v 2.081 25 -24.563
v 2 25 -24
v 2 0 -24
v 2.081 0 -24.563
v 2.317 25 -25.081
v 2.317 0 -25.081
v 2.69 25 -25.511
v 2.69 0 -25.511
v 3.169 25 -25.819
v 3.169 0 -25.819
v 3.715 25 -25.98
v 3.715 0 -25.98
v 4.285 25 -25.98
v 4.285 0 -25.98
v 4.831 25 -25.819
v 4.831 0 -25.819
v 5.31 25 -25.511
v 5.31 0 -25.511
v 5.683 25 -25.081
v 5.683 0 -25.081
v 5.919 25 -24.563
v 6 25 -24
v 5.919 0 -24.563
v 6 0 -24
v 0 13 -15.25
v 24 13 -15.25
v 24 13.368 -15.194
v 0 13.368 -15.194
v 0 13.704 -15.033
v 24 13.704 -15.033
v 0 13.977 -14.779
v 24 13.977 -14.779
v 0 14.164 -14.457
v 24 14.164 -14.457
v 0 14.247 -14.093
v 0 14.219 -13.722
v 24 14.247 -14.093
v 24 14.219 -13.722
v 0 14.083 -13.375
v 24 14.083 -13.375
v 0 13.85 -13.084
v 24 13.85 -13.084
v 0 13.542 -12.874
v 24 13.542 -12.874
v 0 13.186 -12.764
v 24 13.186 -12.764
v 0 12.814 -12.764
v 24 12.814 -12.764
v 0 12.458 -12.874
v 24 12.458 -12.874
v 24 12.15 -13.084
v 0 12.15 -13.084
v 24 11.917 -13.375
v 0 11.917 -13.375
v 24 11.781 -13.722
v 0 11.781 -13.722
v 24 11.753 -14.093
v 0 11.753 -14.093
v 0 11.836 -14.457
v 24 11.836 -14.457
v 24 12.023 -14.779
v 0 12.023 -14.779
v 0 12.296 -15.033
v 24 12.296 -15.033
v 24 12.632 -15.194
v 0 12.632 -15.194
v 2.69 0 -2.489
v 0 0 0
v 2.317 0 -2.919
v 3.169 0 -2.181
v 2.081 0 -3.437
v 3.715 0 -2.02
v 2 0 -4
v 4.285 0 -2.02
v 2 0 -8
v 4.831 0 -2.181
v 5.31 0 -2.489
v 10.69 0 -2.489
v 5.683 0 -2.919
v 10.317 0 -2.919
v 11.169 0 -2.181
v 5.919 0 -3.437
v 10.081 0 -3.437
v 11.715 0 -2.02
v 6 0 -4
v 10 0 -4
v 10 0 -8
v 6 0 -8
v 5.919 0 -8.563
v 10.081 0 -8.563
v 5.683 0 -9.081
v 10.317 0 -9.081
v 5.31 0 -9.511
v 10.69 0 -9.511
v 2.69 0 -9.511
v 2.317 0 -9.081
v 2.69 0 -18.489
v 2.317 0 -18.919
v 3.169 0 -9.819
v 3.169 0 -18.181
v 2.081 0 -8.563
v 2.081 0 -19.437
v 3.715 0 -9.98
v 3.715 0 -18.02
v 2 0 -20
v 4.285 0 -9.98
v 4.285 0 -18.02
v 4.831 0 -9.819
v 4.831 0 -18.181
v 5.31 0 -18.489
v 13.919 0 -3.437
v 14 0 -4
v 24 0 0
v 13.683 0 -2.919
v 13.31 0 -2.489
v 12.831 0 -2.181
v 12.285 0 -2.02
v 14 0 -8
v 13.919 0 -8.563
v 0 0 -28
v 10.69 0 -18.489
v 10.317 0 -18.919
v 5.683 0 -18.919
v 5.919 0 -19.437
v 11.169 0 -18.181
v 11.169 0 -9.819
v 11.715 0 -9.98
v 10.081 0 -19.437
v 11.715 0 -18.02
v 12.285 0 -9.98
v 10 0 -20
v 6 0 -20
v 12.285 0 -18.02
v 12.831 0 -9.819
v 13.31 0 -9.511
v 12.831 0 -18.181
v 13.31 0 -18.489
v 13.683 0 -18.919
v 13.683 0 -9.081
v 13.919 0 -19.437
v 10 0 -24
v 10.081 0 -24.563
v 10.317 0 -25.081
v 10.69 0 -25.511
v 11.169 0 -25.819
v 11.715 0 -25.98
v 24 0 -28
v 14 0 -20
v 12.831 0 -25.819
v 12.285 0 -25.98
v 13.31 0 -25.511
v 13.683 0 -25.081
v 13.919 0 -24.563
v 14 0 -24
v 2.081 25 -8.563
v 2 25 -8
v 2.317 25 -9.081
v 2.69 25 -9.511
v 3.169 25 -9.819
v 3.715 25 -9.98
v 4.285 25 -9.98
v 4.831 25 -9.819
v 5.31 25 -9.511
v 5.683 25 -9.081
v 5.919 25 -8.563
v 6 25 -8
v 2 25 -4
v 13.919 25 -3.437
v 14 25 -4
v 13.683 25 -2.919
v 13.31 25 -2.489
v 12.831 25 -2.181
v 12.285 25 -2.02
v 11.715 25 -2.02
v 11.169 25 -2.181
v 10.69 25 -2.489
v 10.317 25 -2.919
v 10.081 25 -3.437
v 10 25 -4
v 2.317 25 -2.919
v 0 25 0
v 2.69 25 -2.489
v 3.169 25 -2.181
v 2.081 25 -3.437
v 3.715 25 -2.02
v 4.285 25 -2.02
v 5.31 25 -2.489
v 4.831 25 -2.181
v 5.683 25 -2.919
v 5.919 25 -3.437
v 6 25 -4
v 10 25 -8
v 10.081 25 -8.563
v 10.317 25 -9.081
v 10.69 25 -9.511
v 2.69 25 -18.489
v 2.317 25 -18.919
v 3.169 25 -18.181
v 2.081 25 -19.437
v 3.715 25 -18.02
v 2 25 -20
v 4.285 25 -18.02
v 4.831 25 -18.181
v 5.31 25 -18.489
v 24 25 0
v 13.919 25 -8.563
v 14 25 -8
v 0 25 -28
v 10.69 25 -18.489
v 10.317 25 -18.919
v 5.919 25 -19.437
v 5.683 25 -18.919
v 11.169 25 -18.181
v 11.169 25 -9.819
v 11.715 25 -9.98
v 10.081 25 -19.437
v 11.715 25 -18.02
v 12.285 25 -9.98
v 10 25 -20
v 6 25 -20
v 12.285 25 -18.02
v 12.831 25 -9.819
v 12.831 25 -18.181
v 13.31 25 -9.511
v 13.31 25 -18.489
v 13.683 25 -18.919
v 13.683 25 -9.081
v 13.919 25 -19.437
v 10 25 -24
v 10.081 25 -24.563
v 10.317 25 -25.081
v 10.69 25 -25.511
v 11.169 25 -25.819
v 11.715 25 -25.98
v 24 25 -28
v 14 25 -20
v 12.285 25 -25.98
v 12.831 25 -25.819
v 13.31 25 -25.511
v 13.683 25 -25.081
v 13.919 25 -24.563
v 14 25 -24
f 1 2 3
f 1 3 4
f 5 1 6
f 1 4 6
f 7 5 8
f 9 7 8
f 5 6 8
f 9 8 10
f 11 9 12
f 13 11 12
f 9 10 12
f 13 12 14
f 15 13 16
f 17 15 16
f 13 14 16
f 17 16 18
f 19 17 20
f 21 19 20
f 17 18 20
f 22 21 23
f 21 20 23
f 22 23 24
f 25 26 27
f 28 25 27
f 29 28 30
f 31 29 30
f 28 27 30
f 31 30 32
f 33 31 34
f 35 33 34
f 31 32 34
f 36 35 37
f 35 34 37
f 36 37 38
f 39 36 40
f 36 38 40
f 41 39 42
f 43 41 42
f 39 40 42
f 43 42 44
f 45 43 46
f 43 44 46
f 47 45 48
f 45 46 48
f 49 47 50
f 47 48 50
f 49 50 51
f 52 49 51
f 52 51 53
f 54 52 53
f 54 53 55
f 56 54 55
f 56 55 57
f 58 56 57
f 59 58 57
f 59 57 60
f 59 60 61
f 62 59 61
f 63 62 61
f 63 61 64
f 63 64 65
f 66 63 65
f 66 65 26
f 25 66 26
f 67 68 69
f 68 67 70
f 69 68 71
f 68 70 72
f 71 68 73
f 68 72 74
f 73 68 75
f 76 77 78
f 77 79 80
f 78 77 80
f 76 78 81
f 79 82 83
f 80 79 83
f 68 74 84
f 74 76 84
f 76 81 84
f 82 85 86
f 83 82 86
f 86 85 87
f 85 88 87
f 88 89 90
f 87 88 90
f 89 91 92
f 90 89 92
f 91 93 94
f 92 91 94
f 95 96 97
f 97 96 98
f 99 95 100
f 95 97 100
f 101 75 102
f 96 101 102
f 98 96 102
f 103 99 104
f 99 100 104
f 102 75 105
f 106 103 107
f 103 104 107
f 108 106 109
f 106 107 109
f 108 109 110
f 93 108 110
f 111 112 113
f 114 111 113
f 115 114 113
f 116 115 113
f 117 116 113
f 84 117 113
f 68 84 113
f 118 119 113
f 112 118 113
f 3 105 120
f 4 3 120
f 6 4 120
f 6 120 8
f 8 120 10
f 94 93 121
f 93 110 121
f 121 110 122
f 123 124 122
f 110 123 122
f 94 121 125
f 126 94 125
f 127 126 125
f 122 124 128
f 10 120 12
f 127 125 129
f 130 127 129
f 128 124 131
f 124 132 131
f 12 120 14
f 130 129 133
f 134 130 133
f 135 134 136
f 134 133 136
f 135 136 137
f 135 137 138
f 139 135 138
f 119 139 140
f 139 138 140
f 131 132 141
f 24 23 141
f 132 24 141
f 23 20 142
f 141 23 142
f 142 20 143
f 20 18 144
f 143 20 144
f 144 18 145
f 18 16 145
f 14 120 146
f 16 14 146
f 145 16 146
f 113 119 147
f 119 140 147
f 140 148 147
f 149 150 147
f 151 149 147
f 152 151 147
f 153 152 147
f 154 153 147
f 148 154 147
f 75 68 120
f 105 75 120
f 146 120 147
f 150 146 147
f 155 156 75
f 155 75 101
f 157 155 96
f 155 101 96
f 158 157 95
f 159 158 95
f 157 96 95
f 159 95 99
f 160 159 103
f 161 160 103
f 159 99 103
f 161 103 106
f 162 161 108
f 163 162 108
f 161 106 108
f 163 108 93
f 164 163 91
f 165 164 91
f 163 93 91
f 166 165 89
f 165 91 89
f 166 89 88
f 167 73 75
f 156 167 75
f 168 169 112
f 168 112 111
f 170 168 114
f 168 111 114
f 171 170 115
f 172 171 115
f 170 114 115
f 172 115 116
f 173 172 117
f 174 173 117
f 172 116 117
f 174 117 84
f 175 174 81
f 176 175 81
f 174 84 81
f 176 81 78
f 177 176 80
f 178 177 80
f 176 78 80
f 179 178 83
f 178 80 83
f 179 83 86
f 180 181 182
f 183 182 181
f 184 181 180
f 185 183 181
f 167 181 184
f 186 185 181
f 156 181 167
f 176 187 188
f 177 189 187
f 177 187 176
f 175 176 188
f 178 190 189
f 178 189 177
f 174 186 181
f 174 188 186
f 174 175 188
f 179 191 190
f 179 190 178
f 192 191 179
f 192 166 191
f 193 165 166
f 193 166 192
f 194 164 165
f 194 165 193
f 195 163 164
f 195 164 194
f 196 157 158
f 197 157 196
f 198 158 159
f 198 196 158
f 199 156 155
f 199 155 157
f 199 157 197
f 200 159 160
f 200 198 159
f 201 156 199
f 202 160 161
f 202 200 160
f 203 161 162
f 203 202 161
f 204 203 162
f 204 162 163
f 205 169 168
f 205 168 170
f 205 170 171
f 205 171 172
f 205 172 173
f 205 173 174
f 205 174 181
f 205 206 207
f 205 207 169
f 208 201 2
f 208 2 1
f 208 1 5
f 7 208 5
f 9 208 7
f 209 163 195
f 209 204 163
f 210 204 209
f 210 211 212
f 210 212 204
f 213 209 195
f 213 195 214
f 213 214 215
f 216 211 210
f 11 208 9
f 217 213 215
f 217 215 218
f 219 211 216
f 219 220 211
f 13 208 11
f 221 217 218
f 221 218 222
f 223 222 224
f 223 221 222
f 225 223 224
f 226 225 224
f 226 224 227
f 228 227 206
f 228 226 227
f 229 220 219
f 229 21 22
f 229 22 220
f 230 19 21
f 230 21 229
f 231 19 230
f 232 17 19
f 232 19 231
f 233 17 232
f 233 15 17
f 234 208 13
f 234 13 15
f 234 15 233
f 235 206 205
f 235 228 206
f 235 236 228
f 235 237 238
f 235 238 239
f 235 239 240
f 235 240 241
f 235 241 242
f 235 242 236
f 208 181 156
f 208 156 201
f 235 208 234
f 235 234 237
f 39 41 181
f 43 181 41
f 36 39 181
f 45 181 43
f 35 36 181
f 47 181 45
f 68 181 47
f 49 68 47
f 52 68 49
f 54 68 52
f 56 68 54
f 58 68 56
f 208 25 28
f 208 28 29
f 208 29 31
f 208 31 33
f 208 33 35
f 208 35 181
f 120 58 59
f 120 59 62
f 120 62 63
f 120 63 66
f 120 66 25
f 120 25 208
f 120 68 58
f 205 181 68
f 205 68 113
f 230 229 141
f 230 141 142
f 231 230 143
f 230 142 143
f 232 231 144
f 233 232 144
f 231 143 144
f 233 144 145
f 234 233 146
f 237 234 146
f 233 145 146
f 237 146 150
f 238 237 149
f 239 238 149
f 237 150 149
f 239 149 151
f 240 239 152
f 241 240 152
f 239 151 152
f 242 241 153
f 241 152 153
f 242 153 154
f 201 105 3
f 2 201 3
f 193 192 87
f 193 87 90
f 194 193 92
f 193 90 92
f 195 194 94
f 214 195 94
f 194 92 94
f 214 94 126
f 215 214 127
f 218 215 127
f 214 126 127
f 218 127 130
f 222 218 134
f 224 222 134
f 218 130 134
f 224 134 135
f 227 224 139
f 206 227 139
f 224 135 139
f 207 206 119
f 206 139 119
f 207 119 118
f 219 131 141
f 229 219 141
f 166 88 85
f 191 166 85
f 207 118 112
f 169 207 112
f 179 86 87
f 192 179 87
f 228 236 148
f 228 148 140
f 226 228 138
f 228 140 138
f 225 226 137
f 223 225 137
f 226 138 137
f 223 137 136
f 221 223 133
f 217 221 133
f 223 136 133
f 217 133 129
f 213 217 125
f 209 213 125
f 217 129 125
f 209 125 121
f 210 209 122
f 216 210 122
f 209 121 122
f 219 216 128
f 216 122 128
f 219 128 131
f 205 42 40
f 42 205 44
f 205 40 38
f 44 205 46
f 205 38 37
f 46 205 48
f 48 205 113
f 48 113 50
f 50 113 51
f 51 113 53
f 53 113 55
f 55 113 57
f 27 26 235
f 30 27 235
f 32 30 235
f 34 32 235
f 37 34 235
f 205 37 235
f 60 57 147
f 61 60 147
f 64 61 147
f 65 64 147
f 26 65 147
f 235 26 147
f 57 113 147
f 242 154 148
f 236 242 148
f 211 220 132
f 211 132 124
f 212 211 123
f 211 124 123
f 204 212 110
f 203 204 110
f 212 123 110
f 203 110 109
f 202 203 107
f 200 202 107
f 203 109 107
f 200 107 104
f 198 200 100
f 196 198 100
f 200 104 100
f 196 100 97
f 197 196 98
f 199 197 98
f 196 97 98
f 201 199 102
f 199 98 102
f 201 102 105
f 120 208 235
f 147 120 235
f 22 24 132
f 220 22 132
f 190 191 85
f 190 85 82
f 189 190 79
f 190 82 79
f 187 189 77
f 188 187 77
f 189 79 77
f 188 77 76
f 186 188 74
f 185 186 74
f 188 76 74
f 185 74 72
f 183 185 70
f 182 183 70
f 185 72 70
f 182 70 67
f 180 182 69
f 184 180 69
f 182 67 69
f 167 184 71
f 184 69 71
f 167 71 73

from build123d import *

# Parameters (mm, degrees)
SKETCH1_W           = 24
SKETCH1_H           = 28
BOSS_EXTRUDE1_DEPTH = 25
SKETCH2_R           = 1.25
CUT_EXTRUDE1_DEPTH  = 45.55333882


with BuildPart() as part:
    # Sketch1 → Boss-Extrude1 (new body)
    with BuildSketch(Plane(origin=(0, 0, 0), x_dir=(1, 0, 0), z_dir=(0, 1, 0))):
        with Locations((12, 14)):
            Rectangle(SKETCH1_W, SKETCH1_H)
        with BuildLine():
            Line((2, 4), (2, 8))
            ThreePointArc((2, 8), (4, 10), (6, 8))
            Line((6, 8), (6, 4))
            ThreePointArc((6, 4), (4, 2), (2, 4))
        make_face(mode=Mode.SUBTRACT)
        with BuildLine():
            Line((10, 4), (10, 8))
            ThreePointArc((10, 8), (12, 10), (14, 8))
            Line((14, 8), (14, 4))
            ThreePointArc((14, 4), (12, 2), (10, 4))
        make_face(mode=Mode.SUBTRACT)
        with BuildLine():
            Line((10, 20), (10, 24))
            ThreePointArc((10, 24), (12, 26), (14, 24))
            Line((14, 24), (14, 20))
            ThreePointArc((14, 20), (12, 18), (10, 20))
        make_face(mode=Mode.SUBTRACT)
        with BuildLine():
            Line((2, 20), (2, 24))
            ThreePointArc((2, 24), (4, 26), (6, 24))
            Line((6, 24), (6, 20))
            ThreePointArc((6, 20), (4, 18), (2, 20))
        make_face(mode=Mode.SUBTRACT)
    extrude(amount=BOSS_EXTRUDE1_DEPTH)

    # Sketch2 → Cut-Extrude1 (cut, through all)
    with BuildSketch(Plane(origin=(24, 0, 0), x_dir=(0, 0, -1), z_dir=(1, 0, 0))):
        with Locations((14, 13)):
            Circle(SKETCH2_R)
    extrude(amount=-CUT_EXTRUDE1_DEPTH, mode=Mode.SUBTRACT)


solid = part.part
